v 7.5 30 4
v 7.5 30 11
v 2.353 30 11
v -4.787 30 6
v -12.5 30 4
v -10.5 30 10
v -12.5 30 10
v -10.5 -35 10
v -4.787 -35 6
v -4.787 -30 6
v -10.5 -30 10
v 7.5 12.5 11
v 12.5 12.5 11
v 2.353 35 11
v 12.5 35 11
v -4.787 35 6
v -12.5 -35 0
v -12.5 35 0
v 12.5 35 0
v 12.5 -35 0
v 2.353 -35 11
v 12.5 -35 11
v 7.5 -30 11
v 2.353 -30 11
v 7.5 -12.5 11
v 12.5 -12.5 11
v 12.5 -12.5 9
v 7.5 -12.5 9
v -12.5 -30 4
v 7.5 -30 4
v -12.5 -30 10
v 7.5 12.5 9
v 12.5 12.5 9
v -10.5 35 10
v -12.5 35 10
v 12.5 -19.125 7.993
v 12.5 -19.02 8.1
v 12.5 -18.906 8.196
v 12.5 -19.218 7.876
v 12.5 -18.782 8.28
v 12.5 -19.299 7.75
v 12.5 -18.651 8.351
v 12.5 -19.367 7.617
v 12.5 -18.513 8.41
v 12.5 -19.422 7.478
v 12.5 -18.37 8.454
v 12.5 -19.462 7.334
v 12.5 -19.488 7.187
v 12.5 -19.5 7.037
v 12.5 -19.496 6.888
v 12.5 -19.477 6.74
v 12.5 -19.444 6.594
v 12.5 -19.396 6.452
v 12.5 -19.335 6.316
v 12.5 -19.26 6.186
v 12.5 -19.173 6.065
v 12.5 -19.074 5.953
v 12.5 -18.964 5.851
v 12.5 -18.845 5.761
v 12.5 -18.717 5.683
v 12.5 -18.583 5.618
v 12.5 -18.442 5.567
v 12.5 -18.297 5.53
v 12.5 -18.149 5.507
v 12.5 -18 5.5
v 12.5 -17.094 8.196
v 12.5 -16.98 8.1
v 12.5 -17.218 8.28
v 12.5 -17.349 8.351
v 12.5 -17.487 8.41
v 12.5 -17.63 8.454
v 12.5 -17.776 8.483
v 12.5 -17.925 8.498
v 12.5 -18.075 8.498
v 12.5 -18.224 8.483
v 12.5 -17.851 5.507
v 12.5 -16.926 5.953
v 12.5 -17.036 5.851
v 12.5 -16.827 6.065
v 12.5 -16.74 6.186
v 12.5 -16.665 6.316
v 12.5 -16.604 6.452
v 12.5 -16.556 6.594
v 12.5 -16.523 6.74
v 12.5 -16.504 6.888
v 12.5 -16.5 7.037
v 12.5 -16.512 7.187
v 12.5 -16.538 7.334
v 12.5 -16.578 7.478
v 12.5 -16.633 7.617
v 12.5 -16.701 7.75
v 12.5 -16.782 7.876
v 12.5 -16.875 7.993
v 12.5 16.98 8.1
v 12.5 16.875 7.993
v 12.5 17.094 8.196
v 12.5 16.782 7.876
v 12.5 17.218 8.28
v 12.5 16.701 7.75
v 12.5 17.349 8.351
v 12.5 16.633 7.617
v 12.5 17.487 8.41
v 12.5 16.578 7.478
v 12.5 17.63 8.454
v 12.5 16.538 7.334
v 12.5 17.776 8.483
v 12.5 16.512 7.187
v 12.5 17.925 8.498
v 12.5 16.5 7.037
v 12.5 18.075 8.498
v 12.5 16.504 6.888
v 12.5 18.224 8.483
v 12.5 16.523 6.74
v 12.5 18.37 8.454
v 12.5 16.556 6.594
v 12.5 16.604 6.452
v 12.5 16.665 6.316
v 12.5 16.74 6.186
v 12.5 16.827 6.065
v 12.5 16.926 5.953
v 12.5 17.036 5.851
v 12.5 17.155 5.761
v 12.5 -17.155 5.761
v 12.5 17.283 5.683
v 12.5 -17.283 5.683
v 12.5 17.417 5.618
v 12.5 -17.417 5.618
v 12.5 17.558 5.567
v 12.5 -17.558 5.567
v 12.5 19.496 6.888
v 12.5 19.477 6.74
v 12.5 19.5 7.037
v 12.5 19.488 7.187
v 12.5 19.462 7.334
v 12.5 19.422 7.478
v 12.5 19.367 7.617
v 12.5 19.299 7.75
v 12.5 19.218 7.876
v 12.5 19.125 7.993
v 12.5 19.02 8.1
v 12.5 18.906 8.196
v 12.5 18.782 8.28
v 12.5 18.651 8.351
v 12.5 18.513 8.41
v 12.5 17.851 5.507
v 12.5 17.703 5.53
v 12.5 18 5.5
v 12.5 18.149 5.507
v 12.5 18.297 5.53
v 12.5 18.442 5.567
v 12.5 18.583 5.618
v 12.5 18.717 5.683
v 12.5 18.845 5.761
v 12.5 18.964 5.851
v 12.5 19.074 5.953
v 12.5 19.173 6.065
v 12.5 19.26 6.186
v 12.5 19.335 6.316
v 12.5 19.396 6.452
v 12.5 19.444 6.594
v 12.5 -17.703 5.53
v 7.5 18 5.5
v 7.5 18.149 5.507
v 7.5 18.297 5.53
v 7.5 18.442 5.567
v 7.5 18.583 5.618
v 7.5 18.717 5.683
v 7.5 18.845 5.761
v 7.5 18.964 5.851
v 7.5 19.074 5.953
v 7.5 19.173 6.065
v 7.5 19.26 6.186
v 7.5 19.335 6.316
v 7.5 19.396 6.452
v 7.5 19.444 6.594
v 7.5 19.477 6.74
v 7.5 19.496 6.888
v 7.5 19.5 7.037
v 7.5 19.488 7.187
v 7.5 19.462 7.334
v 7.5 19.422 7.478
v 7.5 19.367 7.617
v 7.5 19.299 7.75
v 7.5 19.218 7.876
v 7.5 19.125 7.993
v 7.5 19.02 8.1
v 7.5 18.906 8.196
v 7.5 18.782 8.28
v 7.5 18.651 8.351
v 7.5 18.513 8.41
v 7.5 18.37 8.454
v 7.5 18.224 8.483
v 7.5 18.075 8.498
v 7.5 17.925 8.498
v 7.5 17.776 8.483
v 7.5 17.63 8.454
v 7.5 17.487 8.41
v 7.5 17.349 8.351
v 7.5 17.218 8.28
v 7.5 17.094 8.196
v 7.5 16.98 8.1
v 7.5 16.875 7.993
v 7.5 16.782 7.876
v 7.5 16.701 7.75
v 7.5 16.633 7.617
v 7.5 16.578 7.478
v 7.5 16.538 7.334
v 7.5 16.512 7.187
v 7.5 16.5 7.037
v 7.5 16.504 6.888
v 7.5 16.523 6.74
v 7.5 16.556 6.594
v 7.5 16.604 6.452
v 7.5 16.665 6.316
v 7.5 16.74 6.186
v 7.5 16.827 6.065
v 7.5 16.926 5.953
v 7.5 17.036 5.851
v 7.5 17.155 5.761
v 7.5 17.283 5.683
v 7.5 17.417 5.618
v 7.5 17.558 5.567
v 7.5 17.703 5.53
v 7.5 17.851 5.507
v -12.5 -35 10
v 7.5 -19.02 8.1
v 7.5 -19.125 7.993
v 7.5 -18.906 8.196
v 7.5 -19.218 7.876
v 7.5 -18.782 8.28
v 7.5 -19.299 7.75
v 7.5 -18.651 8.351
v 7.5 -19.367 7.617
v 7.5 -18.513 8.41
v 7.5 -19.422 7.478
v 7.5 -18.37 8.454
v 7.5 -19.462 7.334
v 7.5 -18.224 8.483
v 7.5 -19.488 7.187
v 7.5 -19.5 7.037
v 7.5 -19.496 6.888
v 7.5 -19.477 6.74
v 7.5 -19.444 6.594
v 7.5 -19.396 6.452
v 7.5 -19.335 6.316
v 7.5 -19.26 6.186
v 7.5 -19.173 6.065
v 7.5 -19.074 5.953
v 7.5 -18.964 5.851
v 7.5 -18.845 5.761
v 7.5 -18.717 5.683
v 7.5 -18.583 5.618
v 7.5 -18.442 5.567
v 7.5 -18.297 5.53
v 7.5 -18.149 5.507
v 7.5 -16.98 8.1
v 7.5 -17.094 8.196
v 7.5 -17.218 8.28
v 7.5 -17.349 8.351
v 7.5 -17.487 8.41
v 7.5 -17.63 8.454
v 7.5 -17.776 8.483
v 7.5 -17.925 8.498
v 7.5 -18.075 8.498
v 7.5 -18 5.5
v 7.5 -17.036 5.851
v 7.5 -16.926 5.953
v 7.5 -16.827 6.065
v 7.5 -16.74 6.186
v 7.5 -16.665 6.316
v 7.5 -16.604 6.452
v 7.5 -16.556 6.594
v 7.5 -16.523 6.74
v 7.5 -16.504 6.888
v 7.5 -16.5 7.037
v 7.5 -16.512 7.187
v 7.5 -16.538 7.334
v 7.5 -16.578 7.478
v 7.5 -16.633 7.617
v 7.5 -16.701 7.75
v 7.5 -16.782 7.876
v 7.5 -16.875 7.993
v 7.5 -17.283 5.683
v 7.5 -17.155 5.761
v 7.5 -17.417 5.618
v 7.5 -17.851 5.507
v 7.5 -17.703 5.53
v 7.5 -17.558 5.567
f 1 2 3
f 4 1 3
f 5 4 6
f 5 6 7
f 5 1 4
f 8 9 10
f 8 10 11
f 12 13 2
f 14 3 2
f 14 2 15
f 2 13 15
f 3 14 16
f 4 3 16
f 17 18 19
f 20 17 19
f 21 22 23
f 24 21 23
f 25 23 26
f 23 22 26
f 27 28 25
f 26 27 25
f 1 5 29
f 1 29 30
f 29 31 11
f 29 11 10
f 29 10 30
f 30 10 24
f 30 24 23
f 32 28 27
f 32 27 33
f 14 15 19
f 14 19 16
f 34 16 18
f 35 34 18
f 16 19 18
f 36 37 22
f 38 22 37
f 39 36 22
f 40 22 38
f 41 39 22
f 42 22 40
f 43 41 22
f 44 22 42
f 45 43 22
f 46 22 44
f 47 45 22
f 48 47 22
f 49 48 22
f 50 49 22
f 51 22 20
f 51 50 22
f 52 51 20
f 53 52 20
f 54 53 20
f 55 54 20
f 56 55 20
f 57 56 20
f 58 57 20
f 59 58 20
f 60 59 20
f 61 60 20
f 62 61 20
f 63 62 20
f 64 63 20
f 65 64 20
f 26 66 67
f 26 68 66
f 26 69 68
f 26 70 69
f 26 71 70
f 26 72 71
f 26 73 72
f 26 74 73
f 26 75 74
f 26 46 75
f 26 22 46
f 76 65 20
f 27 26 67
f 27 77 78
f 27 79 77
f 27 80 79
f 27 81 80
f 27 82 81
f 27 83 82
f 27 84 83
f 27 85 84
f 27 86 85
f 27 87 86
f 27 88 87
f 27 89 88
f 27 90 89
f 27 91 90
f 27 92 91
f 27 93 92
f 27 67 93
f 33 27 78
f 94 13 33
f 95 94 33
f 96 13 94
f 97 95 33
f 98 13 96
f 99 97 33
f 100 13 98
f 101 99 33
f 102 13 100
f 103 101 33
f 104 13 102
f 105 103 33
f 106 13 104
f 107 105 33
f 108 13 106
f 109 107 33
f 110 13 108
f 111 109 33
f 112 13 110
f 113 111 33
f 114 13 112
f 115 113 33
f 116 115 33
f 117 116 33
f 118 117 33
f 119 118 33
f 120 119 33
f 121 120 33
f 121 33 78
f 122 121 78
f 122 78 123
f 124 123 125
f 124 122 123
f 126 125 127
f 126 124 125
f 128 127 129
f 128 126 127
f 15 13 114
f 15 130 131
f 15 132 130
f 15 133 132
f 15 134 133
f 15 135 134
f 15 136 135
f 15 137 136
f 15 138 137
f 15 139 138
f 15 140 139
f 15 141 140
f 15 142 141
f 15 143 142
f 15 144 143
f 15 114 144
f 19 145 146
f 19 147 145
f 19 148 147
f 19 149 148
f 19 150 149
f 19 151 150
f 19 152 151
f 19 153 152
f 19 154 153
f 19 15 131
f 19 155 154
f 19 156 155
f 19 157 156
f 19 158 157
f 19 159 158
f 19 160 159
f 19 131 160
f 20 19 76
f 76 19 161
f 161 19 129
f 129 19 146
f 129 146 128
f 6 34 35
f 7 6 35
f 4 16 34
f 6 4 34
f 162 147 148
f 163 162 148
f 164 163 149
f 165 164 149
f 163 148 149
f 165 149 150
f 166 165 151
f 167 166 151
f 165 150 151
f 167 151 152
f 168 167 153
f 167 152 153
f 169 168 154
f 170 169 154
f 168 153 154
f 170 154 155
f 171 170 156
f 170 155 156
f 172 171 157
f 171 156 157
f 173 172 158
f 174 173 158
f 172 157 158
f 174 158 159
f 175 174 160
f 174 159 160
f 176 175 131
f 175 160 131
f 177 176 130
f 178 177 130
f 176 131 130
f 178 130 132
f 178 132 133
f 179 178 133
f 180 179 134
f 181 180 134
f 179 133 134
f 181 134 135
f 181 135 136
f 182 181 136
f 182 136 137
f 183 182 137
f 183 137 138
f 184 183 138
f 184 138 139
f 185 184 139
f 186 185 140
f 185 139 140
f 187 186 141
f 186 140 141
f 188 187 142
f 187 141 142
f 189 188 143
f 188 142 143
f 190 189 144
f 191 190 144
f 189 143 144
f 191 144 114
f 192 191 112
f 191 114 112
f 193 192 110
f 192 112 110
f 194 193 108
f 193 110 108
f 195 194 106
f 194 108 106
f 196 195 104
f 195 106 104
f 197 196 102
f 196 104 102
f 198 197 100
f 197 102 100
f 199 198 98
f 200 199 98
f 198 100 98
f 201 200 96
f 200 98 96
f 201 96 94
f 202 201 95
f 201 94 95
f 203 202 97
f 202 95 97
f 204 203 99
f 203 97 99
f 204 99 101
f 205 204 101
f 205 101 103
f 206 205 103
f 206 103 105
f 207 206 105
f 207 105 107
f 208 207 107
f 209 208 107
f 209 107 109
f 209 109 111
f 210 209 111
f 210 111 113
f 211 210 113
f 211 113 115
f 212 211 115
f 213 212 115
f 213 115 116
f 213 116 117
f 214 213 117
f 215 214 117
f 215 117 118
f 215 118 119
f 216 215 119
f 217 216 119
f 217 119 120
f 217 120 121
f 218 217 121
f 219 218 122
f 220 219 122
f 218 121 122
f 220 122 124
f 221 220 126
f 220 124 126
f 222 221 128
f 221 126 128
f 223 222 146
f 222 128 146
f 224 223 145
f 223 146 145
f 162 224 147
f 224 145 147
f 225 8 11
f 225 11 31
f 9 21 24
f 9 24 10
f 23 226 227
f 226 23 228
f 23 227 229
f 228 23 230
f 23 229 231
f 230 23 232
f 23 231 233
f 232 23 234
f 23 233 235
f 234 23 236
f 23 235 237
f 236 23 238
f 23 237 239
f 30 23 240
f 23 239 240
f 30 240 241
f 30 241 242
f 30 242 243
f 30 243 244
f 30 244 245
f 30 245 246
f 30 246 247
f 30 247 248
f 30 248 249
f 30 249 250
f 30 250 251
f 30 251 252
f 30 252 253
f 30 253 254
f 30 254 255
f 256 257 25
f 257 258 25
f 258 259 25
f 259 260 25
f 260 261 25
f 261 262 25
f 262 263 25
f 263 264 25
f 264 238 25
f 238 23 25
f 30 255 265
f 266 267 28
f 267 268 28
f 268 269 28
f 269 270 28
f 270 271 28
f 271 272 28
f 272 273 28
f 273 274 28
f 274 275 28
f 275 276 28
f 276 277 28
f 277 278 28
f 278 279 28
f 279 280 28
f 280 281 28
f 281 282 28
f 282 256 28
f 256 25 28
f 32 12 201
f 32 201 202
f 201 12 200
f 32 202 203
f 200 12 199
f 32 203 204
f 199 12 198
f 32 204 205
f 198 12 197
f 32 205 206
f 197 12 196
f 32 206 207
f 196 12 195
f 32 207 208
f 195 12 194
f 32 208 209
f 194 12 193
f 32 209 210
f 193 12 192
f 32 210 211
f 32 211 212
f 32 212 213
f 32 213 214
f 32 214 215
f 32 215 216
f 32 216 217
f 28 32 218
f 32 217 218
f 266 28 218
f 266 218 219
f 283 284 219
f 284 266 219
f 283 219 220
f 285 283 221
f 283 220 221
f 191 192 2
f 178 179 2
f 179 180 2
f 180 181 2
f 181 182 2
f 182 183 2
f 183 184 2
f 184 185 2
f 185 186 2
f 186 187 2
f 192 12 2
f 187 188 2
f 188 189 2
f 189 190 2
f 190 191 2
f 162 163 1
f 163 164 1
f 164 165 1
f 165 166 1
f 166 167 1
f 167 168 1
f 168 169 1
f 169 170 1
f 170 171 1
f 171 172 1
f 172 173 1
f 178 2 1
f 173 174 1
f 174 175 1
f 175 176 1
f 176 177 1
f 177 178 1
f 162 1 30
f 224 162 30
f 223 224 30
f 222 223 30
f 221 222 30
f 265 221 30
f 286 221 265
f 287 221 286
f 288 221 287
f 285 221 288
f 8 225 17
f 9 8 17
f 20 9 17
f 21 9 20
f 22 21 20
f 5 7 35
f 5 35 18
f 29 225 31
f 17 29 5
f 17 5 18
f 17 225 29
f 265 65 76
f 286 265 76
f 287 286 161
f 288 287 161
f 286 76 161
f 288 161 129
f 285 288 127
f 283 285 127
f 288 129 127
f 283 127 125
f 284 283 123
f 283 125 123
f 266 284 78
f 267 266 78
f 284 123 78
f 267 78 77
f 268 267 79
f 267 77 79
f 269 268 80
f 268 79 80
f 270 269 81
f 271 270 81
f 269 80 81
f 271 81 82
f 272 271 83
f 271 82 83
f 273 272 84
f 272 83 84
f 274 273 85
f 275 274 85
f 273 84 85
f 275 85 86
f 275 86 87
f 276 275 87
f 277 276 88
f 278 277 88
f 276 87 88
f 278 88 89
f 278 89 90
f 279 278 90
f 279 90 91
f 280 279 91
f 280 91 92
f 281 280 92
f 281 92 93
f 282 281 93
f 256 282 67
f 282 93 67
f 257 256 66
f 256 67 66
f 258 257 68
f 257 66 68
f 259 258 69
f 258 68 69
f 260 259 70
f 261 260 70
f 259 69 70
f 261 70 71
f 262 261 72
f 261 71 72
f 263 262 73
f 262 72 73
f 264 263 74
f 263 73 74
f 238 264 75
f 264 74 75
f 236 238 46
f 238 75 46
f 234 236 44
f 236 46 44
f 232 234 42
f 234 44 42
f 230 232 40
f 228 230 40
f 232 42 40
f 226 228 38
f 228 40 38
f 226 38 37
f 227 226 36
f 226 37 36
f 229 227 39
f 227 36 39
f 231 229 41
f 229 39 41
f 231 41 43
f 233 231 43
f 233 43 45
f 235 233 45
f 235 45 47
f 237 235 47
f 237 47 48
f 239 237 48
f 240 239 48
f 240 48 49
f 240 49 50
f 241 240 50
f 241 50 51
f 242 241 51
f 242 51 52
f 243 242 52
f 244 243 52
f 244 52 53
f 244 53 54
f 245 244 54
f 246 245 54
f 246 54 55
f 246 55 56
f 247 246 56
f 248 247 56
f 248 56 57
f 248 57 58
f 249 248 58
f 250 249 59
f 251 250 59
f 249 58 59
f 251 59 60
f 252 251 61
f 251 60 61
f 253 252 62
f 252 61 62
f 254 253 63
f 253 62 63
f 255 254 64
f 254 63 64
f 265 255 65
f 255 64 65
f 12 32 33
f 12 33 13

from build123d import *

# Parameters (mm, degrees)
SKETCH1_W           = 25
SKETCH1_H           = 70
BOSS_EXTRUDE1_DEPTH = 4
BOSS_EXTRUDE2_DEPTH = 5
BOSS_EXTRUDE3_DEPTH = 5
SKETCH5_W           = 7
SKETCH5_H           = 60
SKETCH5_R           = 1.5
BOSS_EXTRUDE4_DEPTH = 5
CUT_EXTRUDE1_REACH  = 43.785
SKETCH6_W           = 2
SKETCH6_H           = 25


with BuildPart() as part:
    # Sketch1 → Boss-Extrude1 (new body)
    with BuildSketch(Plane.XY):
        Rectangle(SKETCH1_W, SKETCH1_H)
    extrude(amount=BOSS_EXTRUDE1_DEPTH)

    # Sketch2 → Boss-Extrude2 (add)
    with BuildSketch(Plane(origin=(0, 35, 0), x_dir=(1, 0, 0), z_dir=(0, 1, 0))):
        Polygon((-4.787407973, -6), (-10.5, -10), (-12.5, -10), (-12.5, -4), (12.5, -4), (12.5, -11), (2.353332061, -11), align=None)
    extrude(amount=-BOSS_EXTRUDE2_DEPTH)

    # Sketch3 → Boss-Extrude3 (add)
    with BuildSketch(Plane.XZ.offset(35)):
        Polygon((2.353332061, 11), (-4.787407973, 6), (-10.5, 10), (-12.5, 10), (-12.5, 4), (12.5, 4), (12.5, 11), align=None)
    extrude(amount=-BOSS_EXTRUDE3_DEPTH)

    # Sketch5 → Boss-Extrude4 (add)
    with BuildSketch(Plane(origin=(12.5, 0, 0), x_dir=(0, 0, -1), z_dir=(1, 0, 0))):
        with Locations((-7.5, 0)):
            Rectangle(SKETCH5_W, SKETCH5_H)
        with Locations((-7, 18)):
            Circle(SKETCH5_R, mode=Mode.SUBTRACT)
        with Locations((-7, -18)):
            Circle(SKETCH5_R, mode=Mode.SUBTRACT)
    extrude(amount=-BOSS_EXTRUDE4_DEPTH)

    # Sketch6 → Cut-Extrude1 (cut, up to next)
    with BuildSketch(Plane.ZY.offset(-7.5), mode=Mode.PRIVATE) as cut_extrude1_sk1:
        with Locations((10, 0)):
            Rectangle(SKETCH6_W, SKETCH6_H)
    cut_extrude1_tool1 = extrude(cut_extrude1_sk1.sketch, amount=-CUT_EXTRUDE1_REACH, mode=Mode.PRIVATE) & part.part
    add(cut_extrude1_tool1.solids().sort_by_distance((7.5, 0, 10))[0], mode=Mode.SUBTRACT)


solid = part.part
